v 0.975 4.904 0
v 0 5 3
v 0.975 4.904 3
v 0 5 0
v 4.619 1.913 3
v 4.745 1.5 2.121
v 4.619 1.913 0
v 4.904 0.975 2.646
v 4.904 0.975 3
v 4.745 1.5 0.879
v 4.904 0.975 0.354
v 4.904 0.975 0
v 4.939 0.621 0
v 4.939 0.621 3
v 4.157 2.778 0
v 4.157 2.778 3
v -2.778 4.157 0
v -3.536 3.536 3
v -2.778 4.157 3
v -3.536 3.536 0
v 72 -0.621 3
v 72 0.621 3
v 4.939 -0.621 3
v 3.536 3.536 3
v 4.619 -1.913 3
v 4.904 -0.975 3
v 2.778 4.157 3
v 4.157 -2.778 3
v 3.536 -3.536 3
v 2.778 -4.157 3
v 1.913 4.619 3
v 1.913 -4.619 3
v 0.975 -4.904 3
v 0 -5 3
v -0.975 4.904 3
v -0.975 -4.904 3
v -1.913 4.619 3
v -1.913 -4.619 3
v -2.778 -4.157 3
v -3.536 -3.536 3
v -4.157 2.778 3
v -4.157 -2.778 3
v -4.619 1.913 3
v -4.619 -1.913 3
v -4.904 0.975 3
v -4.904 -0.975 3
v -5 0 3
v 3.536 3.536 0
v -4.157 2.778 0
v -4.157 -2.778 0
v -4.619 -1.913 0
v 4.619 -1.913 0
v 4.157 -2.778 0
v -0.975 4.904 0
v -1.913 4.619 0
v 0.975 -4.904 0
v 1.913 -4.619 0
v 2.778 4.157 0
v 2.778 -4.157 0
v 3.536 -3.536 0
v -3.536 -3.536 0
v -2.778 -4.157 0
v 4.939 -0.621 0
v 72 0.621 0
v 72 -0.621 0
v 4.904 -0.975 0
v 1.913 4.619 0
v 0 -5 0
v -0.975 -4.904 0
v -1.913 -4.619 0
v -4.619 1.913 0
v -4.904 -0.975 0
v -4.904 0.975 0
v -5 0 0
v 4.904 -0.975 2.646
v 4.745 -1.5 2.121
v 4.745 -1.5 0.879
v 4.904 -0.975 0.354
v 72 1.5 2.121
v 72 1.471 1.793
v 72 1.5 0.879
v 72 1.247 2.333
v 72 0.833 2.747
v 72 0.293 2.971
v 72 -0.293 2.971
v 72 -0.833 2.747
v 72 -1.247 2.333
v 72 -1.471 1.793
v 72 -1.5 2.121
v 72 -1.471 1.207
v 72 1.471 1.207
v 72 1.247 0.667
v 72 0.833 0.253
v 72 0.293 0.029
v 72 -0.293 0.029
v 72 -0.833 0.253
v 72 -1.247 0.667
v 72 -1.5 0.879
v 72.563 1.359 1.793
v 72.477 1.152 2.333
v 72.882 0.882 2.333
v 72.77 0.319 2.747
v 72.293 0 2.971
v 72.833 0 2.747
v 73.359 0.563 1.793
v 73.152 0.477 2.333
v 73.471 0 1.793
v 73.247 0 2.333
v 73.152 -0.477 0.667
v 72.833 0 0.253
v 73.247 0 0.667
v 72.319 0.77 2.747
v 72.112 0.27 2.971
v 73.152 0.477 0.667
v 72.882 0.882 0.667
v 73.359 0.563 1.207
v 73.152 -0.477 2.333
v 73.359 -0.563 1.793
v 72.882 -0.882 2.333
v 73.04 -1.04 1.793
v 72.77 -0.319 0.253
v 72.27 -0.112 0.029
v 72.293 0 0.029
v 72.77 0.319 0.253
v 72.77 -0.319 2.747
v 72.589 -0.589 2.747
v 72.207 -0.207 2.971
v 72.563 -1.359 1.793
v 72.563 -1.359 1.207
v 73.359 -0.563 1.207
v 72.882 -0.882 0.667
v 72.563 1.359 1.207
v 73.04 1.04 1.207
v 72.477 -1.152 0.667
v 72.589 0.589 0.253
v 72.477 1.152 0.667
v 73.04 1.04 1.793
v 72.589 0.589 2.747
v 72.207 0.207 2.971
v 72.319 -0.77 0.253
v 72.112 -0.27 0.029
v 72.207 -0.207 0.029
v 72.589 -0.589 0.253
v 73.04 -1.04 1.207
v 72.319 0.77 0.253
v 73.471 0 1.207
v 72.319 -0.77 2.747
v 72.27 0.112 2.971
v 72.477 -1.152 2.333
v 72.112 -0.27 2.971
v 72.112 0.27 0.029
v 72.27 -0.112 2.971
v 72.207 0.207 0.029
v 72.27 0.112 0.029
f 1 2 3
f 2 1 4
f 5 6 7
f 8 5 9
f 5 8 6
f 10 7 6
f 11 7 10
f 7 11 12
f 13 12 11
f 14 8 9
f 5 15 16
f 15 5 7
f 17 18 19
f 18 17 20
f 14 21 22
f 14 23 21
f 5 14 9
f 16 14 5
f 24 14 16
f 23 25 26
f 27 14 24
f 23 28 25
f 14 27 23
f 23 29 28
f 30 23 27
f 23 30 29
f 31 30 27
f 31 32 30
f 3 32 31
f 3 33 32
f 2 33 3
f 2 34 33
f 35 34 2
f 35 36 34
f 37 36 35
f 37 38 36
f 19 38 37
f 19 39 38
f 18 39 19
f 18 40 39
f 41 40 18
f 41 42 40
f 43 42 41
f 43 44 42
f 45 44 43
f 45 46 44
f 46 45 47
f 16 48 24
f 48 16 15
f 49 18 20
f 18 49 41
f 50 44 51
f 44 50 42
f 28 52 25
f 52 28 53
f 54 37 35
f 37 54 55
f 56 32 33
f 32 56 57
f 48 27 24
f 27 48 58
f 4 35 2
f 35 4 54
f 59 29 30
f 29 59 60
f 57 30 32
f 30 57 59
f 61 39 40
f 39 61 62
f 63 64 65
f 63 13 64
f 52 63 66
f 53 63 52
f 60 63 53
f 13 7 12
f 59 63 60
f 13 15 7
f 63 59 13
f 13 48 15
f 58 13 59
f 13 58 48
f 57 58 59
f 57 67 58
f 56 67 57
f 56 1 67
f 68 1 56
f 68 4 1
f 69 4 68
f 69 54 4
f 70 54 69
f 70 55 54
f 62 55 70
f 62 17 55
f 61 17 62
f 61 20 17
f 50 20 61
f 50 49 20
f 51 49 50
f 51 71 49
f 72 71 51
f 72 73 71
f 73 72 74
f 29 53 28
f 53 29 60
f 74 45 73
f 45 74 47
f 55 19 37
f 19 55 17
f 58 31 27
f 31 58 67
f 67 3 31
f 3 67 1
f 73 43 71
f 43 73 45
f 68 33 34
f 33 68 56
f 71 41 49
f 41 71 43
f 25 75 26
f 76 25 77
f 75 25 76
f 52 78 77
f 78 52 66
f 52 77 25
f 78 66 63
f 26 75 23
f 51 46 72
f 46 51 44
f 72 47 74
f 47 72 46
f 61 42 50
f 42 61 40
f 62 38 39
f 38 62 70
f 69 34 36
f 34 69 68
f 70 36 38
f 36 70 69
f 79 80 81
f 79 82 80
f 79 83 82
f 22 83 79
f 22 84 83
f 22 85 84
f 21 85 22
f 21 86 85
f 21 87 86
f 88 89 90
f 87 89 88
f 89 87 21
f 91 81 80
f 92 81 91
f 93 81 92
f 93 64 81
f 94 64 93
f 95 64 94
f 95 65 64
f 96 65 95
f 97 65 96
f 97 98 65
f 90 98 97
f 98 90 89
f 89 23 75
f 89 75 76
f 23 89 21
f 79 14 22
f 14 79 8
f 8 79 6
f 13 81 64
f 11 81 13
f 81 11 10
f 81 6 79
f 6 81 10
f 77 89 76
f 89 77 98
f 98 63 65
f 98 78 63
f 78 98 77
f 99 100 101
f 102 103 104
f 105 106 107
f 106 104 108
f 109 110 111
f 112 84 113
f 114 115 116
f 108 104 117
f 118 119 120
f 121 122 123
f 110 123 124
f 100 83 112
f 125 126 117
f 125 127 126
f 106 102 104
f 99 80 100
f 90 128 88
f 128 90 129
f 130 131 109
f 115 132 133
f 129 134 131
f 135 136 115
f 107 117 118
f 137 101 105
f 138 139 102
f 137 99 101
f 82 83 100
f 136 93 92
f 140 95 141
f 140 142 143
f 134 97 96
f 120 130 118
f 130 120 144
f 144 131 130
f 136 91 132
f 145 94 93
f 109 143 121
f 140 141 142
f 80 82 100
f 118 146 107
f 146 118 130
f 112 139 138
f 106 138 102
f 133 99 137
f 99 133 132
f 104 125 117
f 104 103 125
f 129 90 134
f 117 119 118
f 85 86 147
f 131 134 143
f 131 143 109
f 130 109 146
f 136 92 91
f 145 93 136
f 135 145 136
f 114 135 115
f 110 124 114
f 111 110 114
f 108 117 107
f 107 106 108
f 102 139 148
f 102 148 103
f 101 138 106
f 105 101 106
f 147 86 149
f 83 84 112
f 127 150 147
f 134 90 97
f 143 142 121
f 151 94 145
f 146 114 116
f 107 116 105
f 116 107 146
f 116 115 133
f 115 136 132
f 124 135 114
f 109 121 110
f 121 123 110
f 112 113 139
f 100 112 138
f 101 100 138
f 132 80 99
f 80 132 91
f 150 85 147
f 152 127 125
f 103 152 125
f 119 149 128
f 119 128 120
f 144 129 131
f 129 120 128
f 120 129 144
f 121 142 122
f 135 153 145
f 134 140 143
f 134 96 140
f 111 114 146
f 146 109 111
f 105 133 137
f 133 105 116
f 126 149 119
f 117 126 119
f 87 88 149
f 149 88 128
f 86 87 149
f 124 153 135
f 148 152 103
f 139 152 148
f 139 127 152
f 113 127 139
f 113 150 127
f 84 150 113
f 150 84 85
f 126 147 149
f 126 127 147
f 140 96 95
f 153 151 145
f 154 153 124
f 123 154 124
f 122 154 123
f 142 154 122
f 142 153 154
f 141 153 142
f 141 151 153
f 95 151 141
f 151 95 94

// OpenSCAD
thickness = 3;
handleDiameter = 10;
length = 77;

cylinder(d=handleDiameter,h=thickness,$fn=32);
translate([0,0,thickness/2])
rotate([0,90,0]) rotate([0,0,360/16]) cylinder(d=thickness/cos(180/8),h=length-handleDiameter/2,$fn=8);
translate([length-handleDiameter/2,0,thickness/2])
sphere(d=thickness,$fn=16);
